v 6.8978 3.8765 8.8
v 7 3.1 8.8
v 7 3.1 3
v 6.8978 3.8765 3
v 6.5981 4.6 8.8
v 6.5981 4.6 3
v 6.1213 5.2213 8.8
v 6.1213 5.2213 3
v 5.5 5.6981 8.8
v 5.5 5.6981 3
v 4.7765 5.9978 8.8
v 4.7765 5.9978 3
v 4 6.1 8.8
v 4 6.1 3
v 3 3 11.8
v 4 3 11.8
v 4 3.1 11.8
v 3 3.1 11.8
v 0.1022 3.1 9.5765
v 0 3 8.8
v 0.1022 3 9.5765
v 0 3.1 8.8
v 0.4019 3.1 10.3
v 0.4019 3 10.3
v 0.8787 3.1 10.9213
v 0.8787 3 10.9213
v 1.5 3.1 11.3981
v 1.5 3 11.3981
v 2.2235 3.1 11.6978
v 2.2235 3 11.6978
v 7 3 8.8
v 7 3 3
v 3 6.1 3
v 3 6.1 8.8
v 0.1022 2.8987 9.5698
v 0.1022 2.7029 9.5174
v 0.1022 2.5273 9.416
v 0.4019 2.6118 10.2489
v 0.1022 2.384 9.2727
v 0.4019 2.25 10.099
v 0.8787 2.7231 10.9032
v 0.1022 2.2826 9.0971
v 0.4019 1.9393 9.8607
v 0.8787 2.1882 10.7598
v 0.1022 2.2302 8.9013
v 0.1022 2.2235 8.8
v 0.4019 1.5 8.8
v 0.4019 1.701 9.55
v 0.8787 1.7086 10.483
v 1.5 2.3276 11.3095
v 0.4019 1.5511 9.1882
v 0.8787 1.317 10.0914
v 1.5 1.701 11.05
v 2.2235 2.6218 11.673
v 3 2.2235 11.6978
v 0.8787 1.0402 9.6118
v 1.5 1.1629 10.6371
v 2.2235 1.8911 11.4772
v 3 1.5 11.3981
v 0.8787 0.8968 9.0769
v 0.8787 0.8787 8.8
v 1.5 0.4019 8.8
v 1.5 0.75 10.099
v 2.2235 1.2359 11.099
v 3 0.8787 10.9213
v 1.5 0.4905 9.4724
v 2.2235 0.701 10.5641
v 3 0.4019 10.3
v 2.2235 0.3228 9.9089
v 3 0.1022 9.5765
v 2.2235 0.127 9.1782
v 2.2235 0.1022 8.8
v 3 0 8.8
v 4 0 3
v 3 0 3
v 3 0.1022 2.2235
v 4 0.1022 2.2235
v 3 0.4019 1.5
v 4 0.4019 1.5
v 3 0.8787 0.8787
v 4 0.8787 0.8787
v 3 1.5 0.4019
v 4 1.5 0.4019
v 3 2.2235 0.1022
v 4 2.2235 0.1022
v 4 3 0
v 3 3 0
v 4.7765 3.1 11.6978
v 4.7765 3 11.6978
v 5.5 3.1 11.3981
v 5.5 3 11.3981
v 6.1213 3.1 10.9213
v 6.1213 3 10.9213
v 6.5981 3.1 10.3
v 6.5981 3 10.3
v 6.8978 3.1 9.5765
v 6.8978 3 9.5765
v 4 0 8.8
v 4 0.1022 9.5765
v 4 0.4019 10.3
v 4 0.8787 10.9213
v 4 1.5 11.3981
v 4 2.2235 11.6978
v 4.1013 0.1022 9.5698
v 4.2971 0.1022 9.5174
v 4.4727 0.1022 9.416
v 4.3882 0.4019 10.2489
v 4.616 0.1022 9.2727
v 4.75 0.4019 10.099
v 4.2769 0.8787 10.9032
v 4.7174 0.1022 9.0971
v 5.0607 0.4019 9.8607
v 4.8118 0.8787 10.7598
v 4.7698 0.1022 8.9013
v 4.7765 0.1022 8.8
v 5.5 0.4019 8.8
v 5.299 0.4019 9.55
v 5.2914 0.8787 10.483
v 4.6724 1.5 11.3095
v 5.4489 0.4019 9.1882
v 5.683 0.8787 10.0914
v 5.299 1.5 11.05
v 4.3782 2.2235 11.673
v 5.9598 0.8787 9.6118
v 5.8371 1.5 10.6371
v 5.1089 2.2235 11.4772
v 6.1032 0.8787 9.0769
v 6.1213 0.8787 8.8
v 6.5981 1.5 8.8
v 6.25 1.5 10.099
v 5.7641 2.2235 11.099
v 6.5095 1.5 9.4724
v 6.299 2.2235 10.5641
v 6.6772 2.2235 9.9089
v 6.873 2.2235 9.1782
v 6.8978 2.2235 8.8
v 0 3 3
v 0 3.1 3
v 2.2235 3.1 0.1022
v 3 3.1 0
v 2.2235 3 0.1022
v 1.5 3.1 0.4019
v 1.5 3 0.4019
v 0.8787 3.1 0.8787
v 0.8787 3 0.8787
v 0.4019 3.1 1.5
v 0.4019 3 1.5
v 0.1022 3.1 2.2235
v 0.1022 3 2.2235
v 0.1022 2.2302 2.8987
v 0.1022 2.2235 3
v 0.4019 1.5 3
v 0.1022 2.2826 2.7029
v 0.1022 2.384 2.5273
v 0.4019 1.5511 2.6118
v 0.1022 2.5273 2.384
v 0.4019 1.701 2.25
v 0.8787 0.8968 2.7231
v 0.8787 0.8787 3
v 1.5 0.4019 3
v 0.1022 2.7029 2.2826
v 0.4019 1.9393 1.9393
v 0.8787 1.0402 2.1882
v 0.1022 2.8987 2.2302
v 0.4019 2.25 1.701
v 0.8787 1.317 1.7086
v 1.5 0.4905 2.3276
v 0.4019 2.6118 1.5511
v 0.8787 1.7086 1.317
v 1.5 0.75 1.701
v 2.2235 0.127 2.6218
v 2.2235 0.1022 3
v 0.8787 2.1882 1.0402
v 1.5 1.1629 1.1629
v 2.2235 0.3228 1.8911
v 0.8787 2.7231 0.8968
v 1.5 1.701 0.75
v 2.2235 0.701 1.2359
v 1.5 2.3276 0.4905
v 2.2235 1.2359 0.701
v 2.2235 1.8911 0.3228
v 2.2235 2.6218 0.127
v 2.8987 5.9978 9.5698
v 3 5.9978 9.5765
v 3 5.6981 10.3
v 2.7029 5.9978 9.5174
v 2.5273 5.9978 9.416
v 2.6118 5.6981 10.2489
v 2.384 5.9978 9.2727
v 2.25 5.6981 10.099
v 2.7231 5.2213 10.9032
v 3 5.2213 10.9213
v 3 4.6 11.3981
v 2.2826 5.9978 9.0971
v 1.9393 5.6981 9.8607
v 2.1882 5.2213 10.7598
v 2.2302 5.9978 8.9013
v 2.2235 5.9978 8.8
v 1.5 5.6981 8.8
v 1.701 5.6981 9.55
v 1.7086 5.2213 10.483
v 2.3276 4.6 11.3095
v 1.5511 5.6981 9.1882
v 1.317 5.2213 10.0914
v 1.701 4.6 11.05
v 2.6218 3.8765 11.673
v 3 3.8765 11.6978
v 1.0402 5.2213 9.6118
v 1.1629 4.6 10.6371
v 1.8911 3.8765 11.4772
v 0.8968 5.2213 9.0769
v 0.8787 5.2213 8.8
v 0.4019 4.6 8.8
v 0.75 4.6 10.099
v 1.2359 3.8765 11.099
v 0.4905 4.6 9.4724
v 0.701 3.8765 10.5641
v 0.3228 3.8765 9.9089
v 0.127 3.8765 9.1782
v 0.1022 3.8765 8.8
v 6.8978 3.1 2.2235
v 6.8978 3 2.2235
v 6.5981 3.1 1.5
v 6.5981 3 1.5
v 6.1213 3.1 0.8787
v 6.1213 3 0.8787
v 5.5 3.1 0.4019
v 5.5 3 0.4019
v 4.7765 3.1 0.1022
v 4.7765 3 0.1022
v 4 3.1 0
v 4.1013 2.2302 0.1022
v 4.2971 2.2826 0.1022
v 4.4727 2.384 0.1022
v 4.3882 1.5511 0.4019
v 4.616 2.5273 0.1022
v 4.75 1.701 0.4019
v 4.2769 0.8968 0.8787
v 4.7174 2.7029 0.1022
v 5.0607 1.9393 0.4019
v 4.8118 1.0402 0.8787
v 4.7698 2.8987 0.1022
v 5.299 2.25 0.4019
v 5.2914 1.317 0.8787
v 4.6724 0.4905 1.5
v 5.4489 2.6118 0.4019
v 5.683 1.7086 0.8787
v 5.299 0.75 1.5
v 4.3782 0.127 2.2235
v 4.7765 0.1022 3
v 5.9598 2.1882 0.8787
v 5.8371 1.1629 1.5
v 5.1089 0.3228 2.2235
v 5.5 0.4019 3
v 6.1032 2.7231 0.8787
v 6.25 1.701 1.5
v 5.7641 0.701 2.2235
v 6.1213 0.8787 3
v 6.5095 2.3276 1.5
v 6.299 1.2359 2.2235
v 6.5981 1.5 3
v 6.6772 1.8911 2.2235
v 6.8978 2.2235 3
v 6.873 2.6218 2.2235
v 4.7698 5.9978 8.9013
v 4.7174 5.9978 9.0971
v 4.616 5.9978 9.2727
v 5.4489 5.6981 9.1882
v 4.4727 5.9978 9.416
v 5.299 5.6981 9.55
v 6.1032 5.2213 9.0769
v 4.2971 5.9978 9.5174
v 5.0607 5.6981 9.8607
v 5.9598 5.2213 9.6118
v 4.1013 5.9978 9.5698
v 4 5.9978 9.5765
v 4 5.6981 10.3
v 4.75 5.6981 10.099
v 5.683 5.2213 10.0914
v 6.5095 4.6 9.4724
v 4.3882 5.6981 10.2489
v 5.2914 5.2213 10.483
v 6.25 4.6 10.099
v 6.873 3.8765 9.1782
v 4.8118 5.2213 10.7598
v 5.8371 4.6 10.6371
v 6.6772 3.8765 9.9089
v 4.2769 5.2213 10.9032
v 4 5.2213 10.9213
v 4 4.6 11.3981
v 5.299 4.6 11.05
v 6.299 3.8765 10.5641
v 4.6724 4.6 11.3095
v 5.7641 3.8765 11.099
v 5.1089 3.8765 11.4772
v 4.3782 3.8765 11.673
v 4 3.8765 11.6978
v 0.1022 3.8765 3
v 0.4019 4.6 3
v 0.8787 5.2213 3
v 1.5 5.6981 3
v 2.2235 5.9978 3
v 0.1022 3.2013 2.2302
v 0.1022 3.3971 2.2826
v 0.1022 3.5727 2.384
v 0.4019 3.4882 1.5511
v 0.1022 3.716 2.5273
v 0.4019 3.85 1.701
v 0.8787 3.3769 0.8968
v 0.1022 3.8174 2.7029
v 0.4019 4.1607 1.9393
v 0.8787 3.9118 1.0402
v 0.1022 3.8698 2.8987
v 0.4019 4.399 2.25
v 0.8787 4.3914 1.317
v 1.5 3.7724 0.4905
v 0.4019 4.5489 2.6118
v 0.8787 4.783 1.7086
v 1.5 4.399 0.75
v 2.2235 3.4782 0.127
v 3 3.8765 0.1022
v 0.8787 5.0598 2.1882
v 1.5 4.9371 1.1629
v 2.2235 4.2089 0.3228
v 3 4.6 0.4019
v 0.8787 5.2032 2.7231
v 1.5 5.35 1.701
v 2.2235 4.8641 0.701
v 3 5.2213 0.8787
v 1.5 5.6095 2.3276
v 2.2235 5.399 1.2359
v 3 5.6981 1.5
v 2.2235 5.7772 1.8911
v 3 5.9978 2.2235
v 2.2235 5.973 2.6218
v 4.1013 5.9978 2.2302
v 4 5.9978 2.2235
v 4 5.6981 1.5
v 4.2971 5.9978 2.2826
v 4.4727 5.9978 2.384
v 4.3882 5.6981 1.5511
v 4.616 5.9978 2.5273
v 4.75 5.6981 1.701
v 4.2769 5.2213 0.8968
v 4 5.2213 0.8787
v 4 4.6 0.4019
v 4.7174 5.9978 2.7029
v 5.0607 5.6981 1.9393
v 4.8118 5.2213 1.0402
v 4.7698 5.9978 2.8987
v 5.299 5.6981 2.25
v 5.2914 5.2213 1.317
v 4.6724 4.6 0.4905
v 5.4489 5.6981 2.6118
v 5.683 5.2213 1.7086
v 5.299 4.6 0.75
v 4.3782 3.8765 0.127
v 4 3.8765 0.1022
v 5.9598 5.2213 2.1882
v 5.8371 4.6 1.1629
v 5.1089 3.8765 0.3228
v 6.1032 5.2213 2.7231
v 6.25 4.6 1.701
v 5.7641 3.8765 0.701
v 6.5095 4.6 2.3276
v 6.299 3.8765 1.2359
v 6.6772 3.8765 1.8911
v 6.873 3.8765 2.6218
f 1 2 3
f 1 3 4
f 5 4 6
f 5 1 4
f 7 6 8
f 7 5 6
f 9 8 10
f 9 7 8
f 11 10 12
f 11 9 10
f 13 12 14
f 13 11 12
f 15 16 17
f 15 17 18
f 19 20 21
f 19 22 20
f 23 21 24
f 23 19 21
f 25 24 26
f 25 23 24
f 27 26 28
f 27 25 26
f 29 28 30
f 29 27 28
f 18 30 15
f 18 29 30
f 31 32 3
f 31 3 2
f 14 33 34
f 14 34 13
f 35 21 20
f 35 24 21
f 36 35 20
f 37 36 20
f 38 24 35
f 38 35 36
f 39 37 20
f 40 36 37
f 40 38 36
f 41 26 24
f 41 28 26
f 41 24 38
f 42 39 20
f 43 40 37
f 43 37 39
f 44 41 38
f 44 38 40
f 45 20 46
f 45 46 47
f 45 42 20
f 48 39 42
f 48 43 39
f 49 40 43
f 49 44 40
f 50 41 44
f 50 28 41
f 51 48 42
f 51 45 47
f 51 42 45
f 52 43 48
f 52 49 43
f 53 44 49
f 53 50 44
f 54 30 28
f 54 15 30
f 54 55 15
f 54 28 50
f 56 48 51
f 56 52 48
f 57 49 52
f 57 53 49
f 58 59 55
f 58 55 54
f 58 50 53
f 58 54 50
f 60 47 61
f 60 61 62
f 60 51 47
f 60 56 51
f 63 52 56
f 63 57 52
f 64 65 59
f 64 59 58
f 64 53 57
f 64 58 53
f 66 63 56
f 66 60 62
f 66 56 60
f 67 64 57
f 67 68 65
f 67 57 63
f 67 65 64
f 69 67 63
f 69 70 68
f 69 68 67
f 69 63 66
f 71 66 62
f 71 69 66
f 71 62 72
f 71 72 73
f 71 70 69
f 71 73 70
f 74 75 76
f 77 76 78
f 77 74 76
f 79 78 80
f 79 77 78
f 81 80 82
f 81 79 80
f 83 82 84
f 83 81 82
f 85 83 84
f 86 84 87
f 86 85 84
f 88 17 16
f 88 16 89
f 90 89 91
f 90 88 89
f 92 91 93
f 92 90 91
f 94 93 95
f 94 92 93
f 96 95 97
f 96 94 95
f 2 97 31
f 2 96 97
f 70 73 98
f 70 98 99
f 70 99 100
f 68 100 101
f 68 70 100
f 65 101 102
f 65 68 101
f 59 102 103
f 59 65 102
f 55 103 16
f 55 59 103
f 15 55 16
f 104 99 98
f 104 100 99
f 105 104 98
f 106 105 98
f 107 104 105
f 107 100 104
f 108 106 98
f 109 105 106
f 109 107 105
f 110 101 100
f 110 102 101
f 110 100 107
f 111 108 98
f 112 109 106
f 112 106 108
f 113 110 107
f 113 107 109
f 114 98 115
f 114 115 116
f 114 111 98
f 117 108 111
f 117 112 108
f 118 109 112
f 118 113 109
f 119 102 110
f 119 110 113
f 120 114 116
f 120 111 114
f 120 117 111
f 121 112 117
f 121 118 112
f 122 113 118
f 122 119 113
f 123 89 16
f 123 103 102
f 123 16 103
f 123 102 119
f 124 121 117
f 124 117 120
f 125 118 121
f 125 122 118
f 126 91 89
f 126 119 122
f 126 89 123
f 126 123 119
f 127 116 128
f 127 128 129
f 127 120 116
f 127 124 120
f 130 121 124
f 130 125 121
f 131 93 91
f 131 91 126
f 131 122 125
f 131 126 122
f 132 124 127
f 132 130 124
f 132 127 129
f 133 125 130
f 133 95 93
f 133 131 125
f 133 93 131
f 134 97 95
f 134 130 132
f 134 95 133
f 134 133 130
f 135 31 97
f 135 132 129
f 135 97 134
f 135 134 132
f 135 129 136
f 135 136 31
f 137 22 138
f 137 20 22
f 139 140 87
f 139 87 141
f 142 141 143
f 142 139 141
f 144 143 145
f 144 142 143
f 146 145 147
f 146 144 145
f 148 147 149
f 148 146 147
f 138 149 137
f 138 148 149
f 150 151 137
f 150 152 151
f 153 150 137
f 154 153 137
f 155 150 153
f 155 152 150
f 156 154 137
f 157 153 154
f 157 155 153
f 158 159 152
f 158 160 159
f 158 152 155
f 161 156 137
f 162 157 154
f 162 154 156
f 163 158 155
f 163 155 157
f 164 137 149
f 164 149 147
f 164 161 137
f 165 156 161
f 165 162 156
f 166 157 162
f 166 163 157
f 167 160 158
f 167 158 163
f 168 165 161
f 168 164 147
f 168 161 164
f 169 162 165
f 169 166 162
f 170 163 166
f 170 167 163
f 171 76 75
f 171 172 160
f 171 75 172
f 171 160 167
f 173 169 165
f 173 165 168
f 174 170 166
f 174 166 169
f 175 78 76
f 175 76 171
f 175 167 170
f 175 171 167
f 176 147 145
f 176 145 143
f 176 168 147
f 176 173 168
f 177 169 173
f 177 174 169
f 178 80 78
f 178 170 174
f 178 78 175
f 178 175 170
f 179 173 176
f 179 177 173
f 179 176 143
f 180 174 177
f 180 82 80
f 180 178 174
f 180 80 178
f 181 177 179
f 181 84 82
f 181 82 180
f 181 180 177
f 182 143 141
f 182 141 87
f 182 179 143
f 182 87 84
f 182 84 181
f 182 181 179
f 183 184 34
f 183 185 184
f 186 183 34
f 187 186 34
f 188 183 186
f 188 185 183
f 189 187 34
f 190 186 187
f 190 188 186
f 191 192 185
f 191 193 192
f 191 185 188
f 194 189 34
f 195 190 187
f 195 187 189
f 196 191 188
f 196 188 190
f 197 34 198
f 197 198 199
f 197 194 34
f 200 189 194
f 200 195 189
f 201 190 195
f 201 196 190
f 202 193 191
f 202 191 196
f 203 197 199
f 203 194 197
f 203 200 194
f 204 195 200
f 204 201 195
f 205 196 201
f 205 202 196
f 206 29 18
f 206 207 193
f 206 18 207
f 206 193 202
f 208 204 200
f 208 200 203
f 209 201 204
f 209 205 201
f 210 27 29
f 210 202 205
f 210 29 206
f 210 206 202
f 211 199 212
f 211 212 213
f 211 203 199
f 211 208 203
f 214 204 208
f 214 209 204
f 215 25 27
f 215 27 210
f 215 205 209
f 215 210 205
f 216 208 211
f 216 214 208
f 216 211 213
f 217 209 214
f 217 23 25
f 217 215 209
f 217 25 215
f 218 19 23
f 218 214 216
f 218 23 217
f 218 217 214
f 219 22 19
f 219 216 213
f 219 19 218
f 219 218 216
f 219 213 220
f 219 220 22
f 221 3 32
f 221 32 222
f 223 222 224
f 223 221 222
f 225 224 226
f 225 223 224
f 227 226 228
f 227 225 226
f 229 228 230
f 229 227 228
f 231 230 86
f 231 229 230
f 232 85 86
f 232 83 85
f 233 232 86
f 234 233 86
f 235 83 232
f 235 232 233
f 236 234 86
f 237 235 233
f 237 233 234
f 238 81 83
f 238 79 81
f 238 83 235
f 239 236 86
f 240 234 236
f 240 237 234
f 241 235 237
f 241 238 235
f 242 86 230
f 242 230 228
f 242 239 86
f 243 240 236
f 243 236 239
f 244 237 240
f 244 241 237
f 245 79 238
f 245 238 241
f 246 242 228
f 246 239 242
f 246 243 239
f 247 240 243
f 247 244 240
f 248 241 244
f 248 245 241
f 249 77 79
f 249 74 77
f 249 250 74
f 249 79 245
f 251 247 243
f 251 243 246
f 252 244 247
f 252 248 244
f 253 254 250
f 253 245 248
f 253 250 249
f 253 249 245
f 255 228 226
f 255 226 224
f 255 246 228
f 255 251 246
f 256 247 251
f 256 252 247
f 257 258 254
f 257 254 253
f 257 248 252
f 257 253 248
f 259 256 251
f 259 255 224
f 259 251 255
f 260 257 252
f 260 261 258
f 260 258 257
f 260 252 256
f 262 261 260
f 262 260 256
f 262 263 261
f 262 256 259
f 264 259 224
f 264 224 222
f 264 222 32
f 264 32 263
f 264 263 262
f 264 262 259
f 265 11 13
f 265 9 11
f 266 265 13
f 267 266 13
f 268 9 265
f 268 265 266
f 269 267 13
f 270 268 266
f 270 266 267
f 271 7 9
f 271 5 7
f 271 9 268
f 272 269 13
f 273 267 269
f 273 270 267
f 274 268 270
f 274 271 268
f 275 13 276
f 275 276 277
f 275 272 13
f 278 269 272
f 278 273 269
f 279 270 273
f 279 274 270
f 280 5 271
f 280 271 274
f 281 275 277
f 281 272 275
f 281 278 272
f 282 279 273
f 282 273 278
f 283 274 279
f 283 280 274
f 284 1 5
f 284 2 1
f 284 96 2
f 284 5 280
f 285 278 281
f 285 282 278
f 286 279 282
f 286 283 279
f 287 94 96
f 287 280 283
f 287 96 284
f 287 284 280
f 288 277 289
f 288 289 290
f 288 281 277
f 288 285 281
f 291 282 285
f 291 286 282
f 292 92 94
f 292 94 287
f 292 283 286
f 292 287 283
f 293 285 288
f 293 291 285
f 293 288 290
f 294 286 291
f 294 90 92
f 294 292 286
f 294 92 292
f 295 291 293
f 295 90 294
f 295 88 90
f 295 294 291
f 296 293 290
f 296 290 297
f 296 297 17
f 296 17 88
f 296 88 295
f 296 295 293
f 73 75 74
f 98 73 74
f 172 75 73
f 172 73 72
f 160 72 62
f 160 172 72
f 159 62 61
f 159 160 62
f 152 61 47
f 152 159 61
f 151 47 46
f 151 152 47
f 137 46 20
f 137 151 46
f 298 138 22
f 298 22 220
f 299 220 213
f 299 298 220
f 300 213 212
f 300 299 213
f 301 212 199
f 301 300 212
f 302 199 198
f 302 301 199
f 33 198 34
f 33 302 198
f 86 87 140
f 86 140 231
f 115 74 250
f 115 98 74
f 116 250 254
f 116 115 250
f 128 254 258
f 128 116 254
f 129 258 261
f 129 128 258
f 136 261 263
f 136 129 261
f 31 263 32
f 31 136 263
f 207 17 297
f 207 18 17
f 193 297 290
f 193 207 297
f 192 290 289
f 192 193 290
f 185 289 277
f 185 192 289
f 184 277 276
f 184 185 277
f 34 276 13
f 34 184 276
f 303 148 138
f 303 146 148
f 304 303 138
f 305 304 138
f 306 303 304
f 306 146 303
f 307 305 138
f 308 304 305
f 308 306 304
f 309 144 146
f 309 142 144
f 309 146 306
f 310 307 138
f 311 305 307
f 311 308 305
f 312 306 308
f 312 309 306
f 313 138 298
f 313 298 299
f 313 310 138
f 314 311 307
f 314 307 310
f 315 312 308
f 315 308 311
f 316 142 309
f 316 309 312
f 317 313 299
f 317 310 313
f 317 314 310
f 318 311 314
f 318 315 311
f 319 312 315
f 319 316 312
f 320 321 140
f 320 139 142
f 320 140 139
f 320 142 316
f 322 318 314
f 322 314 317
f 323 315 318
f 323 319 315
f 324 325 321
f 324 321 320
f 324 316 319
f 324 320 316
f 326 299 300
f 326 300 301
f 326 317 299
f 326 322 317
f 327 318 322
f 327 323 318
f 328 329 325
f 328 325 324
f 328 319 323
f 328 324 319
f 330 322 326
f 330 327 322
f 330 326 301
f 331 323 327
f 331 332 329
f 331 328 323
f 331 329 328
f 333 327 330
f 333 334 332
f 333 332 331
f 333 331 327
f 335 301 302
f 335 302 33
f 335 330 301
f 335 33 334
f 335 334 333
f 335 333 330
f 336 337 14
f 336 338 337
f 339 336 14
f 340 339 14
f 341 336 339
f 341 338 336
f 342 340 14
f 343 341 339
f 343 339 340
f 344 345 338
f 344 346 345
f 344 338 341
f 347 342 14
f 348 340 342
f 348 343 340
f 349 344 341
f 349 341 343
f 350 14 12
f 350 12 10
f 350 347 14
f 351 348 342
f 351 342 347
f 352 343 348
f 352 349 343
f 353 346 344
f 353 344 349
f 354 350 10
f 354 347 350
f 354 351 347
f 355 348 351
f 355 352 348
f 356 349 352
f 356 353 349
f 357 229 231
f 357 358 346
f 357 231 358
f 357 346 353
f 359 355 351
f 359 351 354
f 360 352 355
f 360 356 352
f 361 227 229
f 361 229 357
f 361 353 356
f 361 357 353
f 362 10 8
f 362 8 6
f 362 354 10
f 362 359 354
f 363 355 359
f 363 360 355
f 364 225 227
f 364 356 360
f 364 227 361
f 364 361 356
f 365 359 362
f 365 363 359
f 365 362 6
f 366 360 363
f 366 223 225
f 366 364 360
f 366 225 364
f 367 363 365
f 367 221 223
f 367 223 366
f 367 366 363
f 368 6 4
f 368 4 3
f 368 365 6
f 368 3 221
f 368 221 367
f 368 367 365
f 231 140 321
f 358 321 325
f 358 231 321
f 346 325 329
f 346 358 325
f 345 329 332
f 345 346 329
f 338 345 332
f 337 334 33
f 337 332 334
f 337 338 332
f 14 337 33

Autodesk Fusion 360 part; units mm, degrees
sketch "Sketch1" plane through (0, 0, 0) normal (0, 1, 0) x (1, 0, 0)
  line L0 (0, 0) -> (7, 0)
  line L1 (7, 0) -> (7, -11.8)
  line L2 (7, -11.8) -> (0, -11.8)
  line L3 (0, -11.8) -> (0, 0)
  dimension "d1" = 7
  dimension "d2" = 11.8
extrude "Extrude1" add sketch "Sketch1" along normal blind 6.1
fillet "Fillet1" radius 3 12 edges at (7, 3.05, 11.8) (3.5, 0, 11.8) (0, 3.05, 11.8) (3.5, 6.1, 11.8) (7, 0, 5.9) (7, 3.05, 0) (3.5, 0, 0) (7, 6.1, 5.9) (0, 0, 5.9) (3.5, 6.1, 0) (0, 6.1, 5.9) (0, 3.05, 0)
